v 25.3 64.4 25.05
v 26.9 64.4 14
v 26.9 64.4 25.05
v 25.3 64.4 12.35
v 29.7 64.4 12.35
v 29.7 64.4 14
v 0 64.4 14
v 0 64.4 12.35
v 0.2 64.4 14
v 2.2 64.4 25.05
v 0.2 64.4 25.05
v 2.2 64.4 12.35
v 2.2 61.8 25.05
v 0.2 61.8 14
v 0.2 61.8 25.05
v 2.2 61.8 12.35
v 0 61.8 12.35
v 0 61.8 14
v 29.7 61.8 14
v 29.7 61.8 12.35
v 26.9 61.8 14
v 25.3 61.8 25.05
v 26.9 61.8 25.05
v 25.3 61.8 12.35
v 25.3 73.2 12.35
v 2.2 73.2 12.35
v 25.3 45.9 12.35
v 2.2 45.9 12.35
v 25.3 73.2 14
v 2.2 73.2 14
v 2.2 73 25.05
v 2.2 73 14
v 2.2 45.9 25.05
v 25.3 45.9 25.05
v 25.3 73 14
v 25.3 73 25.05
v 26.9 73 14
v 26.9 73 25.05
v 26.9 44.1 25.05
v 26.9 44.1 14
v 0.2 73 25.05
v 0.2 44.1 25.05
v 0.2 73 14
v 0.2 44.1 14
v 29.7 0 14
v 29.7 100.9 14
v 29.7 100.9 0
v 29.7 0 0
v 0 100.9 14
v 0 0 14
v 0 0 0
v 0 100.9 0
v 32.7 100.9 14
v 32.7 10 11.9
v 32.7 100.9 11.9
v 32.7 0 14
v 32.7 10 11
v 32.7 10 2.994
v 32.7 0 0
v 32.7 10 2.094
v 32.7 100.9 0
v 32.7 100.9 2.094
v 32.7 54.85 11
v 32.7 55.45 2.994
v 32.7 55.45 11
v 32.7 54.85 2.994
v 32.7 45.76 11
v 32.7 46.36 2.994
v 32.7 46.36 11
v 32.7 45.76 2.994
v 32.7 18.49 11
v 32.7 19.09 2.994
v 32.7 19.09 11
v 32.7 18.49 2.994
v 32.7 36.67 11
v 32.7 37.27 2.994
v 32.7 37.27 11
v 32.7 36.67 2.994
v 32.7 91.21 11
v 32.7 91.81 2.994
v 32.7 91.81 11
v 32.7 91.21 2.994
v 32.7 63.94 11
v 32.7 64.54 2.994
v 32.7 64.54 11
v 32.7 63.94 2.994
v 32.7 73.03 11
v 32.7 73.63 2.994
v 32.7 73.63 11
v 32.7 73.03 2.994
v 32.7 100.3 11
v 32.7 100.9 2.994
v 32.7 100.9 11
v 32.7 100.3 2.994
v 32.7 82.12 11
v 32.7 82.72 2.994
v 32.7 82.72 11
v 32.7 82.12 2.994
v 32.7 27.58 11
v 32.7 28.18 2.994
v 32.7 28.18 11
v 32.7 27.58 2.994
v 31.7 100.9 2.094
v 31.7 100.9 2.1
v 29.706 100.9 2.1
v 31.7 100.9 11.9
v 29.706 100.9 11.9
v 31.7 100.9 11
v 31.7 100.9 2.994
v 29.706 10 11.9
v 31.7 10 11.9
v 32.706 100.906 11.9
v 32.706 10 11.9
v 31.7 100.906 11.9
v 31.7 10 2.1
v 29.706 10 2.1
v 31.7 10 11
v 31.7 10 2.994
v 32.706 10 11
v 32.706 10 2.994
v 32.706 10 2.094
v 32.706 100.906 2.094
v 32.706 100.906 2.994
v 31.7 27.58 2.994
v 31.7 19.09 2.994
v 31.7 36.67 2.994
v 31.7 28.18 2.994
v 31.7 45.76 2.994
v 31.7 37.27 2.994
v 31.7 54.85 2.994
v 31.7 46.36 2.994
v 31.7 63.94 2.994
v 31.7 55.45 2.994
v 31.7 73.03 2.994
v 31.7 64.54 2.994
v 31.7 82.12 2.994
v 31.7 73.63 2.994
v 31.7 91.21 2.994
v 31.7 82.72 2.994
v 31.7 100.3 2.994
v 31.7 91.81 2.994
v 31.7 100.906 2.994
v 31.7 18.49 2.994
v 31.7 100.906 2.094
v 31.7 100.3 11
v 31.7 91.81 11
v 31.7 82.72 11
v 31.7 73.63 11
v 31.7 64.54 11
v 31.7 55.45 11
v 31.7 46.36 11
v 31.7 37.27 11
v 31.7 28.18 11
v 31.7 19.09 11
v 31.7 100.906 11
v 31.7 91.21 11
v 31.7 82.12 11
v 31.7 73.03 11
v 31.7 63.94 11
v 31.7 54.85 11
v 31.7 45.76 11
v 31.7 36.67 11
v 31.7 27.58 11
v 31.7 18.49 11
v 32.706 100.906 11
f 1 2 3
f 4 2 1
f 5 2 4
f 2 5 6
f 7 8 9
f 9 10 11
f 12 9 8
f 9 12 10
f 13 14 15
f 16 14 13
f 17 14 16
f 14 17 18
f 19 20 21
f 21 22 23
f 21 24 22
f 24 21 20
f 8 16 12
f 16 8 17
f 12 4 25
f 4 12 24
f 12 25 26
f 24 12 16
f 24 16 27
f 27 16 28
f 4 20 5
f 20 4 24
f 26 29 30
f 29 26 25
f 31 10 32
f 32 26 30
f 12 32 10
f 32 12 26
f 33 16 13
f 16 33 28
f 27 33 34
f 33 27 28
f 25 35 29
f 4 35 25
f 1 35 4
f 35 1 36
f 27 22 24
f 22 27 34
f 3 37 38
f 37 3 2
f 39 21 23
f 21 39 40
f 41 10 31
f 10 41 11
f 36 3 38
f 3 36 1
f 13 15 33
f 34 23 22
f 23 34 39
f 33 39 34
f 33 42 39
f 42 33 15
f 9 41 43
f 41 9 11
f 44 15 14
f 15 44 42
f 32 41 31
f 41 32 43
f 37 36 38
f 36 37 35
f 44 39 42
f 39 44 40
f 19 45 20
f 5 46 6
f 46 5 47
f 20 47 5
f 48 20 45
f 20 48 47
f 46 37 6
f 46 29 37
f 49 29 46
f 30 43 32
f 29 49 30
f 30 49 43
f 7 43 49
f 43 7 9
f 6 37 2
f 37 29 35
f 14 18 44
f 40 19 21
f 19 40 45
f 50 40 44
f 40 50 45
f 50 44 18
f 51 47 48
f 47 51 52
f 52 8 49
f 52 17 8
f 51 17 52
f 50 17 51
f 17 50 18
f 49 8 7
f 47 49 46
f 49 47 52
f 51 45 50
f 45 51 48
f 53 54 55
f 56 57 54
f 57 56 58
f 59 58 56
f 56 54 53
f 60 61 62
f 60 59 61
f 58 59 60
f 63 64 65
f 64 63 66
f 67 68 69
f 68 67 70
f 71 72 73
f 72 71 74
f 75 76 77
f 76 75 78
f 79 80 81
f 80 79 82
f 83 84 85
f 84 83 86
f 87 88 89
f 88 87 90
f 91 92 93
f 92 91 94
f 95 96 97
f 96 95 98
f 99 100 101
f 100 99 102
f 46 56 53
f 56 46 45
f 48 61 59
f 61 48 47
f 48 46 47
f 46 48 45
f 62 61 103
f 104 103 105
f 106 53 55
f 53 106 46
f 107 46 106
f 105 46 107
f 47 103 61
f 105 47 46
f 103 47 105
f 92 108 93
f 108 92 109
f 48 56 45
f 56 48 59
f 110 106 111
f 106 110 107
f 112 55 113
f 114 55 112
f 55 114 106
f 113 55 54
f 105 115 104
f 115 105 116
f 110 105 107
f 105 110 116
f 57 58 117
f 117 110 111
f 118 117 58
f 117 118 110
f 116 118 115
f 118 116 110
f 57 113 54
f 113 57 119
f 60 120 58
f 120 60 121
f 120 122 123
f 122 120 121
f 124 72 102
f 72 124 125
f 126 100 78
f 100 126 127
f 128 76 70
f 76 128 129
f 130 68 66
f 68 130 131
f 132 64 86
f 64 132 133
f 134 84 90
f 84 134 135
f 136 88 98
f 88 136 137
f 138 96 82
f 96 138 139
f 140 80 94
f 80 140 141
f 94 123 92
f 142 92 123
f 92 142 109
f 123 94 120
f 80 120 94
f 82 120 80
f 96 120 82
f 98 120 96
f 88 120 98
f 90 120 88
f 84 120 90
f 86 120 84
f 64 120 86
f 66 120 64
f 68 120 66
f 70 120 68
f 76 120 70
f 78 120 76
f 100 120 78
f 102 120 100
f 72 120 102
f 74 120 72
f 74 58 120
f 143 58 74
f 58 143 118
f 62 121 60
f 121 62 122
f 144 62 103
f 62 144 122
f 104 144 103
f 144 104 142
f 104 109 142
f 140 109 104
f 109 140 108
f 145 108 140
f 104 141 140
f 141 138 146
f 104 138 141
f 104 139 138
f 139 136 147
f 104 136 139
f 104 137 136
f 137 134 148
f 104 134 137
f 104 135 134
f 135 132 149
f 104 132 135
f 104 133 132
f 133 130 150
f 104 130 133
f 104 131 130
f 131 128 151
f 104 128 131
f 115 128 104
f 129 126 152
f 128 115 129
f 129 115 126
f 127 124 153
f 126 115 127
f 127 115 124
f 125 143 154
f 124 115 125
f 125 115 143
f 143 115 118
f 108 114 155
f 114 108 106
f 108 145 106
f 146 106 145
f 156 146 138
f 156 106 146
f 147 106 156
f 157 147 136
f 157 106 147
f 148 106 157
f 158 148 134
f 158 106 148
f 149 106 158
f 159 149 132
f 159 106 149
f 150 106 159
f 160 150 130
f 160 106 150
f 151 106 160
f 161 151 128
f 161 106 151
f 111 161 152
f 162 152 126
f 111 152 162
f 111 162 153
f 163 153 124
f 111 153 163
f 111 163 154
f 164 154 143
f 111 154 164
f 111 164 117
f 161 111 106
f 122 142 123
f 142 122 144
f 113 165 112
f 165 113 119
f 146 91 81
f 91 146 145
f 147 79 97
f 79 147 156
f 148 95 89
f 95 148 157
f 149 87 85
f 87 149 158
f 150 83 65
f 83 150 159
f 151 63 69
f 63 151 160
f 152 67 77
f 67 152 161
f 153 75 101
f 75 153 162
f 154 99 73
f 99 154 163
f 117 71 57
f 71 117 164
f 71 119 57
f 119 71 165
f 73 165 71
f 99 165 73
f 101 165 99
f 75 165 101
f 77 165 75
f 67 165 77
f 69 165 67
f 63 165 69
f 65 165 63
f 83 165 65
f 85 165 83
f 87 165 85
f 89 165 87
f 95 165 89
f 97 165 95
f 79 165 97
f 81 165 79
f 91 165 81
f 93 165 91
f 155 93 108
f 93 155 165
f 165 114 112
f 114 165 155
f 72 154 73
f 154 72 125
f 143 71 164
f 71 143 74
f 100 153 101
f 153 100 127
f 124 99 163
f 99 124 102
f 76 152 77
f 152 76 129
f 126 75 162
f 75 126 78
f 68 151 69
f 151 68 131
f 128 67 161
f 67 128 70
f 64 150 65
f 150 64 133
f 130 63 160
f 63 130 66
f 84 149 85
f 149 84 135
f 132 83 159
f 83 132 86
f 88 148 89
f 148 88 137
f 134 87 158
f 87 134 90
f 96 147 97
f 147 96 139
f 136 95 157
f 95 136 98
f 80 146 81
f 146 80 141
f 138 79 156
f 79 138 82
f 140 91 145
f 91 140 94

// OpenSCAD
// file: servo.scad
/*
Dimensions here assume orientation like on Adafruit product page,
https://www.adafruit.com/product/169: cables to the left, wide
side facing camera, shaft up
*/

SERVO_WIDTH = 22.7;
SERVO_LENGTH =12.5;
SERVO_HEIGHT = 26.9; // includes cylinder around motor on top

SERVO_FIN_WIDTH = 4.8;
SERVO_FIN_HEIGHT = 2.4;
SERVO_FIN_Z = 15.8;

SERVO_SHAFT_DIAMETER = 5;
SHAFT_SERVO_HEIGHT = 3;
SERVO_SHAFT_X = 6;

SERVO_CABLE_Y = 4.6;
SERVO_CABLE_HEIGHT = 2;

module servo(bleed = 0) {
    width = 22.7 + bleed * 2;
    length =12.5 + bleed * 2;
    height = 26.9 + bleed * 2;

    fin_width = 4.8 + bleed;
    fin_height = 2.4 + bleed;
    fin_z = 15.8 + bleed / 2;

    shaft_diameter = 5 + bleed;
    shaft_height = 3 + bleed;
    shaft_x = 6 + bleed;

    module fins() {
        translate([-fin_width, 0, fin_z]) {
            cube([fin_width * 2 + width, length, fin_height]);
        }
    }

    module shaft() {
        translate([shaft_x, length / 2, height]) {
            cylinder(d = shaft_diameter, h = shaft_height);
        }
    }

    translate([
        -bleed - shaft_x,
        -bleed - length / 2,
        -bleed
    ]) {
        fins();
        shaft();
        cube([width, length, height]);
    }
}
// file: mount.scad
MOUNT_LENGTH = 100.9;
MOUNT_HEIGHT = 14;
MOUNT_DEPTH = 3;

MIN_WALL = .6;
MAX_BRIDGE = 10;

module mount(
    width = MOUNT_DEPTH,
    fdm = false,
    supports_count = undef,
    tolerance = 0
) {
    MOUNT_WALL = 2.1;
    MOUNT_DEPTH = MOUNT_DEPTH + tolerance;
    MOUNT_LIP_DEPTH = 1 - tolerance;
    MOUNT_LIP_BEYOND_WALL = 3 - MOUNT_WALL - tolerance;
    MOUNT_STOP = 10 - tolerance;

    supports_count = supports_count != undef
        ? supports_count
        : ceil((MOUNT_LENGTH - MOUNT_STOP) / MAX_BRIDGE);

    e = .005678;

    cavity_length = MOUNT_LENGTH - MOUNT_STOP;
    cavity_height = MOUNT_HEIGHT - MOUNT_WALL * 2 + tolerance * 2;
    cavity_z = (cavity_height - MOUNT_HEIGHT) / -2;

    module cavity(overage = e) {
        translate([
            width - MOUNT_DEPTH + e,
            MOUNT_STOP,
            cavity_z
        ]) {
            cube([
                MOUNT_DEPTH + overage,
                cavity_length + overage,
                cavity_height
            ]);
        }
    }

    module lips() {
        module lip() {
            cube([
                MOUNT_LIP_DEPTH + e,
                cavity_length + e,
                MOUNT_LIP_BEYOND_WALL
            ]);
        }

        for (z = [
            cavity_z - e,
            MOUNT_HEIGHT - cavity_z - MOUNT_LIP_BEYOND_WALL
        ]) {
            translate([
                width - MOUNT_LIP_DEPTH,
                MOUNT_STOP,
                z
            ]) {
                lip();
            }
        }
    }

    module lips_support(count = supports_count, length = MIN_WALL) {
        start = MOUNT_STOP - length;
        end = MOUNT_LENGTH - length;
        plot = (end - start) / (count);

        // Intentionally 0 indexed to skip overlap w/ MOUNT_STOP
        for (i = [1 : count]) {
            translate([width - MOUNT_LIP_DEPTH, start + i * plot, 0]) {
                cube([MOUNT_LIP_DEPTH, length, MOUNT_HEIGHT]);
            }
        }
    }

    difference() {
        cube([width, MOUNT_LENGTH, MOUNT_HEIGHT]);
        cavity();
    }

    lips();
    # if (fdm) lips_support();
}
// main file
include <mount.scad>;
include <servo.scad>;

module buttonpusher(
    width = SERVO_WIDTH + 4 + 3,

    arm_length = 5,
    arm_diameter = 8,
    arm_clearance = 1
) {
    BUTTON_Y = 75;

    e = .005678;

    wall = 2;

    mount_width = SERVO_WIDTH + wall * 2;

    x = width - mount_width - (SERVO_FIN_WIDTH - wall);
    y = BUTTON_Y - SERVO_HEIGHT - arm_diameter / 2;

    servo_cavity_z = MOUNT_HEIGHT + arm_clearance
        + arm_diameter / 2;
    tolerance = .2;

    module _servo(bleed = 0) {
        translate([
            x + wall - (SERVO_SHAFT_X - SERVO_WIDTH),
            y + wall,
            servo_cavity_z
        ]) rotate([-90, 180, 0]) {
            servo(bleed);
        }
    }

    module servo_cavity() {
        _servo(tolerance);
    }

    module servo_mount() {
        difference() {
            translate([
                x,
                y,
                servo_cavity_z - SERVO_LENGTH / 2 - tolerance
            ]) {
                cube([
                    mount_width,
                    SERVO_HEIGHT + wall,
                    SERVO_LENGTH
                ]);
            }

            servo_cavity();
        }
    }

    /* # _servo(); */

    servo_mount();

    difference() {
        cube([width, MOUNT_LENGTH, MOUNT_HEIGHT]);
        servo_cavity();
    }

    translate([width, 0, 0]) mount(3, fdm = true);
}

buttonpusher();
